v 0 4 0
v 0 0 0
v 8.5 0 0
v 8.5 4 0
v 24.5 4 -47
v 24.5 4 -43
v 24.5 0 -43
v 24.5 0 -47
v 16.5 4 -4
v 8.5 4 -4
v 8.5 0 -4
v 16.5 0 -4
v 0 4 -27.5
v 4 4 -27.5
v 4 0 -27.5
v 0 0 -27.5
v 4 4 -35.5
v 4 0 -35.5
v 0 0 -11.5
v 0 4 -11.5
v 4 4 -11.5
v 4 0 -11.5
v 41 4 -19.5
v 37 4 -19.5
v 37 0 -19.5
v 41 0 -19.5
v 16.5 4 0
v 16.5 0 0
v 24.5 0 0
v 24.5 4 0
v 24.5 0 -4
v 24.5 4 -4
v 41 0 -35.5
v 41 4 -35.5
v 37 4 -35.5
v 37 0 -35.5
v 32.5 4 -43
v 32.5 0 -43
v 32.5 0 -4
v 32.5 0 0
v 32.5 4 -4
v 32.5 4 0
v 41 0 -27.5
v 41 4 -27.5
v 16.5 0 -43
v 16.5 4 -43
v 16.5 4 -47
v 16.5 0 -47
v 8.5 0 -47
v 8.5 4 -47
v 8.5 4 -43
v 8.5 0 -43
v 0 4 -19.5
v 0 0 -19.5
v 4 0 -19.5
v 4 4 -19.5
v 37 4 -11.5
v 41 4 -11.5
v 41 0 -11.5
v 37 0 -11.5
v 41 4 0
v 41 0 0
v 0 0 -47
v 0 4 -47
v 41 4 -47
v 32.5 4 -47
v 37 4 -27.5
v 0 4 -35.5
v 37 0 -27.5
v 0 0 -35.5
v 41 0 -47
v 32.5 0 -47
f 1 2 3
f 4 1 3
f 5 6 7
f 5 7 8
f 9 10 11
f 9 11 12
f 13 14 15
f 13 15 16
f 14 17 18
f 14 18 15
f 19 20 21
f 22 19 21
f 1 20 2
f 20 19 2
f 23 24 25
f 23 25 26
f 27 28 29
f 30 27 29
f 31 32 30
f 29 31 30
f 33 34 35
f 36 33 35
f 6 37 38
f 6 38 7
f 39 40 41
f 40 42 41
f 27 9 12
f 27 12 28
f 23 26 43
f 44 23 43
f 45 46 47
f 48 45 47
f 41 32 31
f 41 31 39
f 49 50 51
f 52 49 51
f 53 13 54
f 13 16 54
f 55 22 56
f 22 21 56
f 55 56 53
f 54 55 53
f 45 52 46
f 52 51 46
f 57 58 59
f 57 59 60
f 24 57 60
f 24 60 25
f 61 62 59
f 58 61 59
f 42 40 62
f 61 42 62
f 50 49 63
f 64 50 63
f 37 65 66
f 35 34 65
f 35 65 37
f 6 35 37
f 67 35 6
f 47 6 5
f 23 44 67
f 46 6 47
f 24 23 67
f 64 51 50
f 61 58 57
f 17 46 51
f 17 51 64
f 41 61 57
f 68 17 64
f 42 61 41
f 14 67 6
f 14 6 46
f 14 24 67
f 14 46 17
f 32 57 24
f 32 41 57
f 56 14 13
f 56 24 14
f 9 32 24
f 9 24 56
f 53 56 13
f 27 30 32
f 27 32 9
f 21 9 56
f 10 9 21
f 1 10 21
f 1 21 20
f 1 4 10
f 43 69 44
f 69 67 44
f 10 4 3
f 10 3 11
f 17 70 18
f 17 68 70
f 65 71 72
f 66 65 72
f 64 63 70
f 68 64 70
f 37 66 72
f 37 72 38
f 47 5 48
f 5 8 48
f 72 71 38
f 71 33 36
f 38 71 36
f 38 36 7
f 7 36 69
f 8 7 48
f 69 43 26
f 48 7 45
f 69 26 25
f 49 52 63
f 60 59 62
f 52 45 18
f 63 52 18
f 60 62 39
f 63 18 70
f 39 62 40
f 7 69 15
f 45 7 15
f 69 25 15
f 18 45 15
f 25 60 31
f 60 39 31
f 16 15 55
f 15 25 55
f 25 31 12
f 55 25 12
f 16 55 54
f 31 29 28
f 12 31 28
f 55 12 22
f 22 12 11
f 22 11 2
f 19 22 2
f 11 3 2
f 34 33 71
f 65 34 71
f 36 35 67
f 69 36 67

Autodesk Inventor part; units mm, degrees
ref_plane "YZ Plane" through (0, 0, 0) normal (1, 0, 0) x (0, 1, 0)
ref_plane "XZ Plane" through (0, 0, 0) normal (0, 1, 0) x (-1, 0, 0)
ref_plane "XY Plane" through (0, 0, 0) normal (0, 0, 1) x (1, 0, 0)
sketch "Sketch1" plane through (0, 0, 0) normal (0, 1, 0) x (-1, 0, 0)
  line L0 (0, 0) -> (-41, 0)
  line L1 (-41, 0) -> (-41, -47)
  line L2 (-41, -47) -> (0, -47)
  line L3 (0, -47) -> (0, 0)
  dimension "d0" = 41
  dimension "d1" = 47
extrude "Extrusion1" add sketch "Sketch1" along normal blind 4
sketch "Sketch2" plane through (0, 4, 0) normal (0, 1, 0) x (1, 0, 0)
  line L0 (41, 47) -> (0, 47) construction
  line L1 (0, 47) -> (0, 0) construction
  line L2 (0, 0) -> (41, 0) construction
  line L3 (41, 0) -> (41, 47) construction
  line L4 (4, 4) -> (4, 43) construction
  line L5 (4, 43) -> (37, 43) construction
  line L6 (37, 43) -> (37, 4) construction
  line L7 (37, 4) -> (4, 4) construction
  line L8 (0, 35.5) -> (4, 35.5)
  line L9 (4, 35.5) -> (4, 27.5)
  line L10 (4, 27.5) -> (0, 27.5)
  line L11 (0, 35.5) -> (0, 27.5)
  line L12 (0, 23.5) -> (41, 23.5) construction
  line L13 (20.5, 0) -> (20.5, 47) construction
  line L14 (41, 47) -> (0, 47) construction
  line L15 (8.5, 47) -> (8.5, 43)
  line L16 (8.5, 43) -> (16.5, 43)
  line L17 (16.5, 43) -> (16.5, 47)
  line L18 (16.5, 47) -> (8.5, 47)
  line L19 (41, 35.5) -> (37, 35.5)
  line L20 (37, 35.5) -> (37, 27.5)
  line L21 (37, 27.5) -> (41, 27.5)
  line L22 (41, 35.5) -> (41, 27.5)
  line L23 (32.5, 47) -> (32.5, 43)
  line L24 (32.5, 43) -> (24.5, 43)
  line L25 (24.5, 43) -> (24.5, 47)
  line L26 (24.5, 47) -> (32.5, 47)
  line L27 (41, 0) -> (0, 0)
  line L28 (4, 4) -> (37, 4)
  line L29 (0, 11.5) -> (4, 11.5)
  line L30 (4, 11.5) -> (4, 19.5)
  line L31 (4, 19.5) -> (0, 19.5)
  line L32 (0, 11.5) -> (0, 19.5)
  line L33 (41, 0) -> (0, 0)
  line L34 (8.5, 0) -> (8.5, 4)
  line L35 (8.5, 4) -> (16.5, 4)
  line L36 (16.5, 4) -> (16.5, 0)
  line L37 (16.5, 0) -> (8.5, 0)
  line L38 (24.5, 4) -> (24.5, 0)
  line L39 (32.5, 0) -> (32.5, 4)
  line L40 (37, 11.5) -> (37, 19.5)
  line L41 (41, 11.5) -> (37, 11.5)
  line L42 (41, 11.5) -> (41, 19.5)
  line L43 (37, 19.5) -> (41, 19.5)
  line L44 (24.5, 0) -> (32.5, 0)
  line L45 (32.5, 4) -> (24.5, 4)
  dimension "d8" = 4
  dimension "d9" = 8
  dimension "d10" = 4
  dimension "d11" = 8
  dimension "d12" = 4
extrude "Extrusion2" cut sketch "Sketch2" against normal up to surface (4 mm away) contours L8 L9 L10 L11 | L18 L17 L16 L15 | L22 L21 L20 L19 | L23 L24 L25 L26 | L27 L38 L28 L39 | L27 L34 L28 L36 | L32 L31 L30 L29 | L40 L43 L42 L41
properties part number "right" material "PBT Plastic Black"
